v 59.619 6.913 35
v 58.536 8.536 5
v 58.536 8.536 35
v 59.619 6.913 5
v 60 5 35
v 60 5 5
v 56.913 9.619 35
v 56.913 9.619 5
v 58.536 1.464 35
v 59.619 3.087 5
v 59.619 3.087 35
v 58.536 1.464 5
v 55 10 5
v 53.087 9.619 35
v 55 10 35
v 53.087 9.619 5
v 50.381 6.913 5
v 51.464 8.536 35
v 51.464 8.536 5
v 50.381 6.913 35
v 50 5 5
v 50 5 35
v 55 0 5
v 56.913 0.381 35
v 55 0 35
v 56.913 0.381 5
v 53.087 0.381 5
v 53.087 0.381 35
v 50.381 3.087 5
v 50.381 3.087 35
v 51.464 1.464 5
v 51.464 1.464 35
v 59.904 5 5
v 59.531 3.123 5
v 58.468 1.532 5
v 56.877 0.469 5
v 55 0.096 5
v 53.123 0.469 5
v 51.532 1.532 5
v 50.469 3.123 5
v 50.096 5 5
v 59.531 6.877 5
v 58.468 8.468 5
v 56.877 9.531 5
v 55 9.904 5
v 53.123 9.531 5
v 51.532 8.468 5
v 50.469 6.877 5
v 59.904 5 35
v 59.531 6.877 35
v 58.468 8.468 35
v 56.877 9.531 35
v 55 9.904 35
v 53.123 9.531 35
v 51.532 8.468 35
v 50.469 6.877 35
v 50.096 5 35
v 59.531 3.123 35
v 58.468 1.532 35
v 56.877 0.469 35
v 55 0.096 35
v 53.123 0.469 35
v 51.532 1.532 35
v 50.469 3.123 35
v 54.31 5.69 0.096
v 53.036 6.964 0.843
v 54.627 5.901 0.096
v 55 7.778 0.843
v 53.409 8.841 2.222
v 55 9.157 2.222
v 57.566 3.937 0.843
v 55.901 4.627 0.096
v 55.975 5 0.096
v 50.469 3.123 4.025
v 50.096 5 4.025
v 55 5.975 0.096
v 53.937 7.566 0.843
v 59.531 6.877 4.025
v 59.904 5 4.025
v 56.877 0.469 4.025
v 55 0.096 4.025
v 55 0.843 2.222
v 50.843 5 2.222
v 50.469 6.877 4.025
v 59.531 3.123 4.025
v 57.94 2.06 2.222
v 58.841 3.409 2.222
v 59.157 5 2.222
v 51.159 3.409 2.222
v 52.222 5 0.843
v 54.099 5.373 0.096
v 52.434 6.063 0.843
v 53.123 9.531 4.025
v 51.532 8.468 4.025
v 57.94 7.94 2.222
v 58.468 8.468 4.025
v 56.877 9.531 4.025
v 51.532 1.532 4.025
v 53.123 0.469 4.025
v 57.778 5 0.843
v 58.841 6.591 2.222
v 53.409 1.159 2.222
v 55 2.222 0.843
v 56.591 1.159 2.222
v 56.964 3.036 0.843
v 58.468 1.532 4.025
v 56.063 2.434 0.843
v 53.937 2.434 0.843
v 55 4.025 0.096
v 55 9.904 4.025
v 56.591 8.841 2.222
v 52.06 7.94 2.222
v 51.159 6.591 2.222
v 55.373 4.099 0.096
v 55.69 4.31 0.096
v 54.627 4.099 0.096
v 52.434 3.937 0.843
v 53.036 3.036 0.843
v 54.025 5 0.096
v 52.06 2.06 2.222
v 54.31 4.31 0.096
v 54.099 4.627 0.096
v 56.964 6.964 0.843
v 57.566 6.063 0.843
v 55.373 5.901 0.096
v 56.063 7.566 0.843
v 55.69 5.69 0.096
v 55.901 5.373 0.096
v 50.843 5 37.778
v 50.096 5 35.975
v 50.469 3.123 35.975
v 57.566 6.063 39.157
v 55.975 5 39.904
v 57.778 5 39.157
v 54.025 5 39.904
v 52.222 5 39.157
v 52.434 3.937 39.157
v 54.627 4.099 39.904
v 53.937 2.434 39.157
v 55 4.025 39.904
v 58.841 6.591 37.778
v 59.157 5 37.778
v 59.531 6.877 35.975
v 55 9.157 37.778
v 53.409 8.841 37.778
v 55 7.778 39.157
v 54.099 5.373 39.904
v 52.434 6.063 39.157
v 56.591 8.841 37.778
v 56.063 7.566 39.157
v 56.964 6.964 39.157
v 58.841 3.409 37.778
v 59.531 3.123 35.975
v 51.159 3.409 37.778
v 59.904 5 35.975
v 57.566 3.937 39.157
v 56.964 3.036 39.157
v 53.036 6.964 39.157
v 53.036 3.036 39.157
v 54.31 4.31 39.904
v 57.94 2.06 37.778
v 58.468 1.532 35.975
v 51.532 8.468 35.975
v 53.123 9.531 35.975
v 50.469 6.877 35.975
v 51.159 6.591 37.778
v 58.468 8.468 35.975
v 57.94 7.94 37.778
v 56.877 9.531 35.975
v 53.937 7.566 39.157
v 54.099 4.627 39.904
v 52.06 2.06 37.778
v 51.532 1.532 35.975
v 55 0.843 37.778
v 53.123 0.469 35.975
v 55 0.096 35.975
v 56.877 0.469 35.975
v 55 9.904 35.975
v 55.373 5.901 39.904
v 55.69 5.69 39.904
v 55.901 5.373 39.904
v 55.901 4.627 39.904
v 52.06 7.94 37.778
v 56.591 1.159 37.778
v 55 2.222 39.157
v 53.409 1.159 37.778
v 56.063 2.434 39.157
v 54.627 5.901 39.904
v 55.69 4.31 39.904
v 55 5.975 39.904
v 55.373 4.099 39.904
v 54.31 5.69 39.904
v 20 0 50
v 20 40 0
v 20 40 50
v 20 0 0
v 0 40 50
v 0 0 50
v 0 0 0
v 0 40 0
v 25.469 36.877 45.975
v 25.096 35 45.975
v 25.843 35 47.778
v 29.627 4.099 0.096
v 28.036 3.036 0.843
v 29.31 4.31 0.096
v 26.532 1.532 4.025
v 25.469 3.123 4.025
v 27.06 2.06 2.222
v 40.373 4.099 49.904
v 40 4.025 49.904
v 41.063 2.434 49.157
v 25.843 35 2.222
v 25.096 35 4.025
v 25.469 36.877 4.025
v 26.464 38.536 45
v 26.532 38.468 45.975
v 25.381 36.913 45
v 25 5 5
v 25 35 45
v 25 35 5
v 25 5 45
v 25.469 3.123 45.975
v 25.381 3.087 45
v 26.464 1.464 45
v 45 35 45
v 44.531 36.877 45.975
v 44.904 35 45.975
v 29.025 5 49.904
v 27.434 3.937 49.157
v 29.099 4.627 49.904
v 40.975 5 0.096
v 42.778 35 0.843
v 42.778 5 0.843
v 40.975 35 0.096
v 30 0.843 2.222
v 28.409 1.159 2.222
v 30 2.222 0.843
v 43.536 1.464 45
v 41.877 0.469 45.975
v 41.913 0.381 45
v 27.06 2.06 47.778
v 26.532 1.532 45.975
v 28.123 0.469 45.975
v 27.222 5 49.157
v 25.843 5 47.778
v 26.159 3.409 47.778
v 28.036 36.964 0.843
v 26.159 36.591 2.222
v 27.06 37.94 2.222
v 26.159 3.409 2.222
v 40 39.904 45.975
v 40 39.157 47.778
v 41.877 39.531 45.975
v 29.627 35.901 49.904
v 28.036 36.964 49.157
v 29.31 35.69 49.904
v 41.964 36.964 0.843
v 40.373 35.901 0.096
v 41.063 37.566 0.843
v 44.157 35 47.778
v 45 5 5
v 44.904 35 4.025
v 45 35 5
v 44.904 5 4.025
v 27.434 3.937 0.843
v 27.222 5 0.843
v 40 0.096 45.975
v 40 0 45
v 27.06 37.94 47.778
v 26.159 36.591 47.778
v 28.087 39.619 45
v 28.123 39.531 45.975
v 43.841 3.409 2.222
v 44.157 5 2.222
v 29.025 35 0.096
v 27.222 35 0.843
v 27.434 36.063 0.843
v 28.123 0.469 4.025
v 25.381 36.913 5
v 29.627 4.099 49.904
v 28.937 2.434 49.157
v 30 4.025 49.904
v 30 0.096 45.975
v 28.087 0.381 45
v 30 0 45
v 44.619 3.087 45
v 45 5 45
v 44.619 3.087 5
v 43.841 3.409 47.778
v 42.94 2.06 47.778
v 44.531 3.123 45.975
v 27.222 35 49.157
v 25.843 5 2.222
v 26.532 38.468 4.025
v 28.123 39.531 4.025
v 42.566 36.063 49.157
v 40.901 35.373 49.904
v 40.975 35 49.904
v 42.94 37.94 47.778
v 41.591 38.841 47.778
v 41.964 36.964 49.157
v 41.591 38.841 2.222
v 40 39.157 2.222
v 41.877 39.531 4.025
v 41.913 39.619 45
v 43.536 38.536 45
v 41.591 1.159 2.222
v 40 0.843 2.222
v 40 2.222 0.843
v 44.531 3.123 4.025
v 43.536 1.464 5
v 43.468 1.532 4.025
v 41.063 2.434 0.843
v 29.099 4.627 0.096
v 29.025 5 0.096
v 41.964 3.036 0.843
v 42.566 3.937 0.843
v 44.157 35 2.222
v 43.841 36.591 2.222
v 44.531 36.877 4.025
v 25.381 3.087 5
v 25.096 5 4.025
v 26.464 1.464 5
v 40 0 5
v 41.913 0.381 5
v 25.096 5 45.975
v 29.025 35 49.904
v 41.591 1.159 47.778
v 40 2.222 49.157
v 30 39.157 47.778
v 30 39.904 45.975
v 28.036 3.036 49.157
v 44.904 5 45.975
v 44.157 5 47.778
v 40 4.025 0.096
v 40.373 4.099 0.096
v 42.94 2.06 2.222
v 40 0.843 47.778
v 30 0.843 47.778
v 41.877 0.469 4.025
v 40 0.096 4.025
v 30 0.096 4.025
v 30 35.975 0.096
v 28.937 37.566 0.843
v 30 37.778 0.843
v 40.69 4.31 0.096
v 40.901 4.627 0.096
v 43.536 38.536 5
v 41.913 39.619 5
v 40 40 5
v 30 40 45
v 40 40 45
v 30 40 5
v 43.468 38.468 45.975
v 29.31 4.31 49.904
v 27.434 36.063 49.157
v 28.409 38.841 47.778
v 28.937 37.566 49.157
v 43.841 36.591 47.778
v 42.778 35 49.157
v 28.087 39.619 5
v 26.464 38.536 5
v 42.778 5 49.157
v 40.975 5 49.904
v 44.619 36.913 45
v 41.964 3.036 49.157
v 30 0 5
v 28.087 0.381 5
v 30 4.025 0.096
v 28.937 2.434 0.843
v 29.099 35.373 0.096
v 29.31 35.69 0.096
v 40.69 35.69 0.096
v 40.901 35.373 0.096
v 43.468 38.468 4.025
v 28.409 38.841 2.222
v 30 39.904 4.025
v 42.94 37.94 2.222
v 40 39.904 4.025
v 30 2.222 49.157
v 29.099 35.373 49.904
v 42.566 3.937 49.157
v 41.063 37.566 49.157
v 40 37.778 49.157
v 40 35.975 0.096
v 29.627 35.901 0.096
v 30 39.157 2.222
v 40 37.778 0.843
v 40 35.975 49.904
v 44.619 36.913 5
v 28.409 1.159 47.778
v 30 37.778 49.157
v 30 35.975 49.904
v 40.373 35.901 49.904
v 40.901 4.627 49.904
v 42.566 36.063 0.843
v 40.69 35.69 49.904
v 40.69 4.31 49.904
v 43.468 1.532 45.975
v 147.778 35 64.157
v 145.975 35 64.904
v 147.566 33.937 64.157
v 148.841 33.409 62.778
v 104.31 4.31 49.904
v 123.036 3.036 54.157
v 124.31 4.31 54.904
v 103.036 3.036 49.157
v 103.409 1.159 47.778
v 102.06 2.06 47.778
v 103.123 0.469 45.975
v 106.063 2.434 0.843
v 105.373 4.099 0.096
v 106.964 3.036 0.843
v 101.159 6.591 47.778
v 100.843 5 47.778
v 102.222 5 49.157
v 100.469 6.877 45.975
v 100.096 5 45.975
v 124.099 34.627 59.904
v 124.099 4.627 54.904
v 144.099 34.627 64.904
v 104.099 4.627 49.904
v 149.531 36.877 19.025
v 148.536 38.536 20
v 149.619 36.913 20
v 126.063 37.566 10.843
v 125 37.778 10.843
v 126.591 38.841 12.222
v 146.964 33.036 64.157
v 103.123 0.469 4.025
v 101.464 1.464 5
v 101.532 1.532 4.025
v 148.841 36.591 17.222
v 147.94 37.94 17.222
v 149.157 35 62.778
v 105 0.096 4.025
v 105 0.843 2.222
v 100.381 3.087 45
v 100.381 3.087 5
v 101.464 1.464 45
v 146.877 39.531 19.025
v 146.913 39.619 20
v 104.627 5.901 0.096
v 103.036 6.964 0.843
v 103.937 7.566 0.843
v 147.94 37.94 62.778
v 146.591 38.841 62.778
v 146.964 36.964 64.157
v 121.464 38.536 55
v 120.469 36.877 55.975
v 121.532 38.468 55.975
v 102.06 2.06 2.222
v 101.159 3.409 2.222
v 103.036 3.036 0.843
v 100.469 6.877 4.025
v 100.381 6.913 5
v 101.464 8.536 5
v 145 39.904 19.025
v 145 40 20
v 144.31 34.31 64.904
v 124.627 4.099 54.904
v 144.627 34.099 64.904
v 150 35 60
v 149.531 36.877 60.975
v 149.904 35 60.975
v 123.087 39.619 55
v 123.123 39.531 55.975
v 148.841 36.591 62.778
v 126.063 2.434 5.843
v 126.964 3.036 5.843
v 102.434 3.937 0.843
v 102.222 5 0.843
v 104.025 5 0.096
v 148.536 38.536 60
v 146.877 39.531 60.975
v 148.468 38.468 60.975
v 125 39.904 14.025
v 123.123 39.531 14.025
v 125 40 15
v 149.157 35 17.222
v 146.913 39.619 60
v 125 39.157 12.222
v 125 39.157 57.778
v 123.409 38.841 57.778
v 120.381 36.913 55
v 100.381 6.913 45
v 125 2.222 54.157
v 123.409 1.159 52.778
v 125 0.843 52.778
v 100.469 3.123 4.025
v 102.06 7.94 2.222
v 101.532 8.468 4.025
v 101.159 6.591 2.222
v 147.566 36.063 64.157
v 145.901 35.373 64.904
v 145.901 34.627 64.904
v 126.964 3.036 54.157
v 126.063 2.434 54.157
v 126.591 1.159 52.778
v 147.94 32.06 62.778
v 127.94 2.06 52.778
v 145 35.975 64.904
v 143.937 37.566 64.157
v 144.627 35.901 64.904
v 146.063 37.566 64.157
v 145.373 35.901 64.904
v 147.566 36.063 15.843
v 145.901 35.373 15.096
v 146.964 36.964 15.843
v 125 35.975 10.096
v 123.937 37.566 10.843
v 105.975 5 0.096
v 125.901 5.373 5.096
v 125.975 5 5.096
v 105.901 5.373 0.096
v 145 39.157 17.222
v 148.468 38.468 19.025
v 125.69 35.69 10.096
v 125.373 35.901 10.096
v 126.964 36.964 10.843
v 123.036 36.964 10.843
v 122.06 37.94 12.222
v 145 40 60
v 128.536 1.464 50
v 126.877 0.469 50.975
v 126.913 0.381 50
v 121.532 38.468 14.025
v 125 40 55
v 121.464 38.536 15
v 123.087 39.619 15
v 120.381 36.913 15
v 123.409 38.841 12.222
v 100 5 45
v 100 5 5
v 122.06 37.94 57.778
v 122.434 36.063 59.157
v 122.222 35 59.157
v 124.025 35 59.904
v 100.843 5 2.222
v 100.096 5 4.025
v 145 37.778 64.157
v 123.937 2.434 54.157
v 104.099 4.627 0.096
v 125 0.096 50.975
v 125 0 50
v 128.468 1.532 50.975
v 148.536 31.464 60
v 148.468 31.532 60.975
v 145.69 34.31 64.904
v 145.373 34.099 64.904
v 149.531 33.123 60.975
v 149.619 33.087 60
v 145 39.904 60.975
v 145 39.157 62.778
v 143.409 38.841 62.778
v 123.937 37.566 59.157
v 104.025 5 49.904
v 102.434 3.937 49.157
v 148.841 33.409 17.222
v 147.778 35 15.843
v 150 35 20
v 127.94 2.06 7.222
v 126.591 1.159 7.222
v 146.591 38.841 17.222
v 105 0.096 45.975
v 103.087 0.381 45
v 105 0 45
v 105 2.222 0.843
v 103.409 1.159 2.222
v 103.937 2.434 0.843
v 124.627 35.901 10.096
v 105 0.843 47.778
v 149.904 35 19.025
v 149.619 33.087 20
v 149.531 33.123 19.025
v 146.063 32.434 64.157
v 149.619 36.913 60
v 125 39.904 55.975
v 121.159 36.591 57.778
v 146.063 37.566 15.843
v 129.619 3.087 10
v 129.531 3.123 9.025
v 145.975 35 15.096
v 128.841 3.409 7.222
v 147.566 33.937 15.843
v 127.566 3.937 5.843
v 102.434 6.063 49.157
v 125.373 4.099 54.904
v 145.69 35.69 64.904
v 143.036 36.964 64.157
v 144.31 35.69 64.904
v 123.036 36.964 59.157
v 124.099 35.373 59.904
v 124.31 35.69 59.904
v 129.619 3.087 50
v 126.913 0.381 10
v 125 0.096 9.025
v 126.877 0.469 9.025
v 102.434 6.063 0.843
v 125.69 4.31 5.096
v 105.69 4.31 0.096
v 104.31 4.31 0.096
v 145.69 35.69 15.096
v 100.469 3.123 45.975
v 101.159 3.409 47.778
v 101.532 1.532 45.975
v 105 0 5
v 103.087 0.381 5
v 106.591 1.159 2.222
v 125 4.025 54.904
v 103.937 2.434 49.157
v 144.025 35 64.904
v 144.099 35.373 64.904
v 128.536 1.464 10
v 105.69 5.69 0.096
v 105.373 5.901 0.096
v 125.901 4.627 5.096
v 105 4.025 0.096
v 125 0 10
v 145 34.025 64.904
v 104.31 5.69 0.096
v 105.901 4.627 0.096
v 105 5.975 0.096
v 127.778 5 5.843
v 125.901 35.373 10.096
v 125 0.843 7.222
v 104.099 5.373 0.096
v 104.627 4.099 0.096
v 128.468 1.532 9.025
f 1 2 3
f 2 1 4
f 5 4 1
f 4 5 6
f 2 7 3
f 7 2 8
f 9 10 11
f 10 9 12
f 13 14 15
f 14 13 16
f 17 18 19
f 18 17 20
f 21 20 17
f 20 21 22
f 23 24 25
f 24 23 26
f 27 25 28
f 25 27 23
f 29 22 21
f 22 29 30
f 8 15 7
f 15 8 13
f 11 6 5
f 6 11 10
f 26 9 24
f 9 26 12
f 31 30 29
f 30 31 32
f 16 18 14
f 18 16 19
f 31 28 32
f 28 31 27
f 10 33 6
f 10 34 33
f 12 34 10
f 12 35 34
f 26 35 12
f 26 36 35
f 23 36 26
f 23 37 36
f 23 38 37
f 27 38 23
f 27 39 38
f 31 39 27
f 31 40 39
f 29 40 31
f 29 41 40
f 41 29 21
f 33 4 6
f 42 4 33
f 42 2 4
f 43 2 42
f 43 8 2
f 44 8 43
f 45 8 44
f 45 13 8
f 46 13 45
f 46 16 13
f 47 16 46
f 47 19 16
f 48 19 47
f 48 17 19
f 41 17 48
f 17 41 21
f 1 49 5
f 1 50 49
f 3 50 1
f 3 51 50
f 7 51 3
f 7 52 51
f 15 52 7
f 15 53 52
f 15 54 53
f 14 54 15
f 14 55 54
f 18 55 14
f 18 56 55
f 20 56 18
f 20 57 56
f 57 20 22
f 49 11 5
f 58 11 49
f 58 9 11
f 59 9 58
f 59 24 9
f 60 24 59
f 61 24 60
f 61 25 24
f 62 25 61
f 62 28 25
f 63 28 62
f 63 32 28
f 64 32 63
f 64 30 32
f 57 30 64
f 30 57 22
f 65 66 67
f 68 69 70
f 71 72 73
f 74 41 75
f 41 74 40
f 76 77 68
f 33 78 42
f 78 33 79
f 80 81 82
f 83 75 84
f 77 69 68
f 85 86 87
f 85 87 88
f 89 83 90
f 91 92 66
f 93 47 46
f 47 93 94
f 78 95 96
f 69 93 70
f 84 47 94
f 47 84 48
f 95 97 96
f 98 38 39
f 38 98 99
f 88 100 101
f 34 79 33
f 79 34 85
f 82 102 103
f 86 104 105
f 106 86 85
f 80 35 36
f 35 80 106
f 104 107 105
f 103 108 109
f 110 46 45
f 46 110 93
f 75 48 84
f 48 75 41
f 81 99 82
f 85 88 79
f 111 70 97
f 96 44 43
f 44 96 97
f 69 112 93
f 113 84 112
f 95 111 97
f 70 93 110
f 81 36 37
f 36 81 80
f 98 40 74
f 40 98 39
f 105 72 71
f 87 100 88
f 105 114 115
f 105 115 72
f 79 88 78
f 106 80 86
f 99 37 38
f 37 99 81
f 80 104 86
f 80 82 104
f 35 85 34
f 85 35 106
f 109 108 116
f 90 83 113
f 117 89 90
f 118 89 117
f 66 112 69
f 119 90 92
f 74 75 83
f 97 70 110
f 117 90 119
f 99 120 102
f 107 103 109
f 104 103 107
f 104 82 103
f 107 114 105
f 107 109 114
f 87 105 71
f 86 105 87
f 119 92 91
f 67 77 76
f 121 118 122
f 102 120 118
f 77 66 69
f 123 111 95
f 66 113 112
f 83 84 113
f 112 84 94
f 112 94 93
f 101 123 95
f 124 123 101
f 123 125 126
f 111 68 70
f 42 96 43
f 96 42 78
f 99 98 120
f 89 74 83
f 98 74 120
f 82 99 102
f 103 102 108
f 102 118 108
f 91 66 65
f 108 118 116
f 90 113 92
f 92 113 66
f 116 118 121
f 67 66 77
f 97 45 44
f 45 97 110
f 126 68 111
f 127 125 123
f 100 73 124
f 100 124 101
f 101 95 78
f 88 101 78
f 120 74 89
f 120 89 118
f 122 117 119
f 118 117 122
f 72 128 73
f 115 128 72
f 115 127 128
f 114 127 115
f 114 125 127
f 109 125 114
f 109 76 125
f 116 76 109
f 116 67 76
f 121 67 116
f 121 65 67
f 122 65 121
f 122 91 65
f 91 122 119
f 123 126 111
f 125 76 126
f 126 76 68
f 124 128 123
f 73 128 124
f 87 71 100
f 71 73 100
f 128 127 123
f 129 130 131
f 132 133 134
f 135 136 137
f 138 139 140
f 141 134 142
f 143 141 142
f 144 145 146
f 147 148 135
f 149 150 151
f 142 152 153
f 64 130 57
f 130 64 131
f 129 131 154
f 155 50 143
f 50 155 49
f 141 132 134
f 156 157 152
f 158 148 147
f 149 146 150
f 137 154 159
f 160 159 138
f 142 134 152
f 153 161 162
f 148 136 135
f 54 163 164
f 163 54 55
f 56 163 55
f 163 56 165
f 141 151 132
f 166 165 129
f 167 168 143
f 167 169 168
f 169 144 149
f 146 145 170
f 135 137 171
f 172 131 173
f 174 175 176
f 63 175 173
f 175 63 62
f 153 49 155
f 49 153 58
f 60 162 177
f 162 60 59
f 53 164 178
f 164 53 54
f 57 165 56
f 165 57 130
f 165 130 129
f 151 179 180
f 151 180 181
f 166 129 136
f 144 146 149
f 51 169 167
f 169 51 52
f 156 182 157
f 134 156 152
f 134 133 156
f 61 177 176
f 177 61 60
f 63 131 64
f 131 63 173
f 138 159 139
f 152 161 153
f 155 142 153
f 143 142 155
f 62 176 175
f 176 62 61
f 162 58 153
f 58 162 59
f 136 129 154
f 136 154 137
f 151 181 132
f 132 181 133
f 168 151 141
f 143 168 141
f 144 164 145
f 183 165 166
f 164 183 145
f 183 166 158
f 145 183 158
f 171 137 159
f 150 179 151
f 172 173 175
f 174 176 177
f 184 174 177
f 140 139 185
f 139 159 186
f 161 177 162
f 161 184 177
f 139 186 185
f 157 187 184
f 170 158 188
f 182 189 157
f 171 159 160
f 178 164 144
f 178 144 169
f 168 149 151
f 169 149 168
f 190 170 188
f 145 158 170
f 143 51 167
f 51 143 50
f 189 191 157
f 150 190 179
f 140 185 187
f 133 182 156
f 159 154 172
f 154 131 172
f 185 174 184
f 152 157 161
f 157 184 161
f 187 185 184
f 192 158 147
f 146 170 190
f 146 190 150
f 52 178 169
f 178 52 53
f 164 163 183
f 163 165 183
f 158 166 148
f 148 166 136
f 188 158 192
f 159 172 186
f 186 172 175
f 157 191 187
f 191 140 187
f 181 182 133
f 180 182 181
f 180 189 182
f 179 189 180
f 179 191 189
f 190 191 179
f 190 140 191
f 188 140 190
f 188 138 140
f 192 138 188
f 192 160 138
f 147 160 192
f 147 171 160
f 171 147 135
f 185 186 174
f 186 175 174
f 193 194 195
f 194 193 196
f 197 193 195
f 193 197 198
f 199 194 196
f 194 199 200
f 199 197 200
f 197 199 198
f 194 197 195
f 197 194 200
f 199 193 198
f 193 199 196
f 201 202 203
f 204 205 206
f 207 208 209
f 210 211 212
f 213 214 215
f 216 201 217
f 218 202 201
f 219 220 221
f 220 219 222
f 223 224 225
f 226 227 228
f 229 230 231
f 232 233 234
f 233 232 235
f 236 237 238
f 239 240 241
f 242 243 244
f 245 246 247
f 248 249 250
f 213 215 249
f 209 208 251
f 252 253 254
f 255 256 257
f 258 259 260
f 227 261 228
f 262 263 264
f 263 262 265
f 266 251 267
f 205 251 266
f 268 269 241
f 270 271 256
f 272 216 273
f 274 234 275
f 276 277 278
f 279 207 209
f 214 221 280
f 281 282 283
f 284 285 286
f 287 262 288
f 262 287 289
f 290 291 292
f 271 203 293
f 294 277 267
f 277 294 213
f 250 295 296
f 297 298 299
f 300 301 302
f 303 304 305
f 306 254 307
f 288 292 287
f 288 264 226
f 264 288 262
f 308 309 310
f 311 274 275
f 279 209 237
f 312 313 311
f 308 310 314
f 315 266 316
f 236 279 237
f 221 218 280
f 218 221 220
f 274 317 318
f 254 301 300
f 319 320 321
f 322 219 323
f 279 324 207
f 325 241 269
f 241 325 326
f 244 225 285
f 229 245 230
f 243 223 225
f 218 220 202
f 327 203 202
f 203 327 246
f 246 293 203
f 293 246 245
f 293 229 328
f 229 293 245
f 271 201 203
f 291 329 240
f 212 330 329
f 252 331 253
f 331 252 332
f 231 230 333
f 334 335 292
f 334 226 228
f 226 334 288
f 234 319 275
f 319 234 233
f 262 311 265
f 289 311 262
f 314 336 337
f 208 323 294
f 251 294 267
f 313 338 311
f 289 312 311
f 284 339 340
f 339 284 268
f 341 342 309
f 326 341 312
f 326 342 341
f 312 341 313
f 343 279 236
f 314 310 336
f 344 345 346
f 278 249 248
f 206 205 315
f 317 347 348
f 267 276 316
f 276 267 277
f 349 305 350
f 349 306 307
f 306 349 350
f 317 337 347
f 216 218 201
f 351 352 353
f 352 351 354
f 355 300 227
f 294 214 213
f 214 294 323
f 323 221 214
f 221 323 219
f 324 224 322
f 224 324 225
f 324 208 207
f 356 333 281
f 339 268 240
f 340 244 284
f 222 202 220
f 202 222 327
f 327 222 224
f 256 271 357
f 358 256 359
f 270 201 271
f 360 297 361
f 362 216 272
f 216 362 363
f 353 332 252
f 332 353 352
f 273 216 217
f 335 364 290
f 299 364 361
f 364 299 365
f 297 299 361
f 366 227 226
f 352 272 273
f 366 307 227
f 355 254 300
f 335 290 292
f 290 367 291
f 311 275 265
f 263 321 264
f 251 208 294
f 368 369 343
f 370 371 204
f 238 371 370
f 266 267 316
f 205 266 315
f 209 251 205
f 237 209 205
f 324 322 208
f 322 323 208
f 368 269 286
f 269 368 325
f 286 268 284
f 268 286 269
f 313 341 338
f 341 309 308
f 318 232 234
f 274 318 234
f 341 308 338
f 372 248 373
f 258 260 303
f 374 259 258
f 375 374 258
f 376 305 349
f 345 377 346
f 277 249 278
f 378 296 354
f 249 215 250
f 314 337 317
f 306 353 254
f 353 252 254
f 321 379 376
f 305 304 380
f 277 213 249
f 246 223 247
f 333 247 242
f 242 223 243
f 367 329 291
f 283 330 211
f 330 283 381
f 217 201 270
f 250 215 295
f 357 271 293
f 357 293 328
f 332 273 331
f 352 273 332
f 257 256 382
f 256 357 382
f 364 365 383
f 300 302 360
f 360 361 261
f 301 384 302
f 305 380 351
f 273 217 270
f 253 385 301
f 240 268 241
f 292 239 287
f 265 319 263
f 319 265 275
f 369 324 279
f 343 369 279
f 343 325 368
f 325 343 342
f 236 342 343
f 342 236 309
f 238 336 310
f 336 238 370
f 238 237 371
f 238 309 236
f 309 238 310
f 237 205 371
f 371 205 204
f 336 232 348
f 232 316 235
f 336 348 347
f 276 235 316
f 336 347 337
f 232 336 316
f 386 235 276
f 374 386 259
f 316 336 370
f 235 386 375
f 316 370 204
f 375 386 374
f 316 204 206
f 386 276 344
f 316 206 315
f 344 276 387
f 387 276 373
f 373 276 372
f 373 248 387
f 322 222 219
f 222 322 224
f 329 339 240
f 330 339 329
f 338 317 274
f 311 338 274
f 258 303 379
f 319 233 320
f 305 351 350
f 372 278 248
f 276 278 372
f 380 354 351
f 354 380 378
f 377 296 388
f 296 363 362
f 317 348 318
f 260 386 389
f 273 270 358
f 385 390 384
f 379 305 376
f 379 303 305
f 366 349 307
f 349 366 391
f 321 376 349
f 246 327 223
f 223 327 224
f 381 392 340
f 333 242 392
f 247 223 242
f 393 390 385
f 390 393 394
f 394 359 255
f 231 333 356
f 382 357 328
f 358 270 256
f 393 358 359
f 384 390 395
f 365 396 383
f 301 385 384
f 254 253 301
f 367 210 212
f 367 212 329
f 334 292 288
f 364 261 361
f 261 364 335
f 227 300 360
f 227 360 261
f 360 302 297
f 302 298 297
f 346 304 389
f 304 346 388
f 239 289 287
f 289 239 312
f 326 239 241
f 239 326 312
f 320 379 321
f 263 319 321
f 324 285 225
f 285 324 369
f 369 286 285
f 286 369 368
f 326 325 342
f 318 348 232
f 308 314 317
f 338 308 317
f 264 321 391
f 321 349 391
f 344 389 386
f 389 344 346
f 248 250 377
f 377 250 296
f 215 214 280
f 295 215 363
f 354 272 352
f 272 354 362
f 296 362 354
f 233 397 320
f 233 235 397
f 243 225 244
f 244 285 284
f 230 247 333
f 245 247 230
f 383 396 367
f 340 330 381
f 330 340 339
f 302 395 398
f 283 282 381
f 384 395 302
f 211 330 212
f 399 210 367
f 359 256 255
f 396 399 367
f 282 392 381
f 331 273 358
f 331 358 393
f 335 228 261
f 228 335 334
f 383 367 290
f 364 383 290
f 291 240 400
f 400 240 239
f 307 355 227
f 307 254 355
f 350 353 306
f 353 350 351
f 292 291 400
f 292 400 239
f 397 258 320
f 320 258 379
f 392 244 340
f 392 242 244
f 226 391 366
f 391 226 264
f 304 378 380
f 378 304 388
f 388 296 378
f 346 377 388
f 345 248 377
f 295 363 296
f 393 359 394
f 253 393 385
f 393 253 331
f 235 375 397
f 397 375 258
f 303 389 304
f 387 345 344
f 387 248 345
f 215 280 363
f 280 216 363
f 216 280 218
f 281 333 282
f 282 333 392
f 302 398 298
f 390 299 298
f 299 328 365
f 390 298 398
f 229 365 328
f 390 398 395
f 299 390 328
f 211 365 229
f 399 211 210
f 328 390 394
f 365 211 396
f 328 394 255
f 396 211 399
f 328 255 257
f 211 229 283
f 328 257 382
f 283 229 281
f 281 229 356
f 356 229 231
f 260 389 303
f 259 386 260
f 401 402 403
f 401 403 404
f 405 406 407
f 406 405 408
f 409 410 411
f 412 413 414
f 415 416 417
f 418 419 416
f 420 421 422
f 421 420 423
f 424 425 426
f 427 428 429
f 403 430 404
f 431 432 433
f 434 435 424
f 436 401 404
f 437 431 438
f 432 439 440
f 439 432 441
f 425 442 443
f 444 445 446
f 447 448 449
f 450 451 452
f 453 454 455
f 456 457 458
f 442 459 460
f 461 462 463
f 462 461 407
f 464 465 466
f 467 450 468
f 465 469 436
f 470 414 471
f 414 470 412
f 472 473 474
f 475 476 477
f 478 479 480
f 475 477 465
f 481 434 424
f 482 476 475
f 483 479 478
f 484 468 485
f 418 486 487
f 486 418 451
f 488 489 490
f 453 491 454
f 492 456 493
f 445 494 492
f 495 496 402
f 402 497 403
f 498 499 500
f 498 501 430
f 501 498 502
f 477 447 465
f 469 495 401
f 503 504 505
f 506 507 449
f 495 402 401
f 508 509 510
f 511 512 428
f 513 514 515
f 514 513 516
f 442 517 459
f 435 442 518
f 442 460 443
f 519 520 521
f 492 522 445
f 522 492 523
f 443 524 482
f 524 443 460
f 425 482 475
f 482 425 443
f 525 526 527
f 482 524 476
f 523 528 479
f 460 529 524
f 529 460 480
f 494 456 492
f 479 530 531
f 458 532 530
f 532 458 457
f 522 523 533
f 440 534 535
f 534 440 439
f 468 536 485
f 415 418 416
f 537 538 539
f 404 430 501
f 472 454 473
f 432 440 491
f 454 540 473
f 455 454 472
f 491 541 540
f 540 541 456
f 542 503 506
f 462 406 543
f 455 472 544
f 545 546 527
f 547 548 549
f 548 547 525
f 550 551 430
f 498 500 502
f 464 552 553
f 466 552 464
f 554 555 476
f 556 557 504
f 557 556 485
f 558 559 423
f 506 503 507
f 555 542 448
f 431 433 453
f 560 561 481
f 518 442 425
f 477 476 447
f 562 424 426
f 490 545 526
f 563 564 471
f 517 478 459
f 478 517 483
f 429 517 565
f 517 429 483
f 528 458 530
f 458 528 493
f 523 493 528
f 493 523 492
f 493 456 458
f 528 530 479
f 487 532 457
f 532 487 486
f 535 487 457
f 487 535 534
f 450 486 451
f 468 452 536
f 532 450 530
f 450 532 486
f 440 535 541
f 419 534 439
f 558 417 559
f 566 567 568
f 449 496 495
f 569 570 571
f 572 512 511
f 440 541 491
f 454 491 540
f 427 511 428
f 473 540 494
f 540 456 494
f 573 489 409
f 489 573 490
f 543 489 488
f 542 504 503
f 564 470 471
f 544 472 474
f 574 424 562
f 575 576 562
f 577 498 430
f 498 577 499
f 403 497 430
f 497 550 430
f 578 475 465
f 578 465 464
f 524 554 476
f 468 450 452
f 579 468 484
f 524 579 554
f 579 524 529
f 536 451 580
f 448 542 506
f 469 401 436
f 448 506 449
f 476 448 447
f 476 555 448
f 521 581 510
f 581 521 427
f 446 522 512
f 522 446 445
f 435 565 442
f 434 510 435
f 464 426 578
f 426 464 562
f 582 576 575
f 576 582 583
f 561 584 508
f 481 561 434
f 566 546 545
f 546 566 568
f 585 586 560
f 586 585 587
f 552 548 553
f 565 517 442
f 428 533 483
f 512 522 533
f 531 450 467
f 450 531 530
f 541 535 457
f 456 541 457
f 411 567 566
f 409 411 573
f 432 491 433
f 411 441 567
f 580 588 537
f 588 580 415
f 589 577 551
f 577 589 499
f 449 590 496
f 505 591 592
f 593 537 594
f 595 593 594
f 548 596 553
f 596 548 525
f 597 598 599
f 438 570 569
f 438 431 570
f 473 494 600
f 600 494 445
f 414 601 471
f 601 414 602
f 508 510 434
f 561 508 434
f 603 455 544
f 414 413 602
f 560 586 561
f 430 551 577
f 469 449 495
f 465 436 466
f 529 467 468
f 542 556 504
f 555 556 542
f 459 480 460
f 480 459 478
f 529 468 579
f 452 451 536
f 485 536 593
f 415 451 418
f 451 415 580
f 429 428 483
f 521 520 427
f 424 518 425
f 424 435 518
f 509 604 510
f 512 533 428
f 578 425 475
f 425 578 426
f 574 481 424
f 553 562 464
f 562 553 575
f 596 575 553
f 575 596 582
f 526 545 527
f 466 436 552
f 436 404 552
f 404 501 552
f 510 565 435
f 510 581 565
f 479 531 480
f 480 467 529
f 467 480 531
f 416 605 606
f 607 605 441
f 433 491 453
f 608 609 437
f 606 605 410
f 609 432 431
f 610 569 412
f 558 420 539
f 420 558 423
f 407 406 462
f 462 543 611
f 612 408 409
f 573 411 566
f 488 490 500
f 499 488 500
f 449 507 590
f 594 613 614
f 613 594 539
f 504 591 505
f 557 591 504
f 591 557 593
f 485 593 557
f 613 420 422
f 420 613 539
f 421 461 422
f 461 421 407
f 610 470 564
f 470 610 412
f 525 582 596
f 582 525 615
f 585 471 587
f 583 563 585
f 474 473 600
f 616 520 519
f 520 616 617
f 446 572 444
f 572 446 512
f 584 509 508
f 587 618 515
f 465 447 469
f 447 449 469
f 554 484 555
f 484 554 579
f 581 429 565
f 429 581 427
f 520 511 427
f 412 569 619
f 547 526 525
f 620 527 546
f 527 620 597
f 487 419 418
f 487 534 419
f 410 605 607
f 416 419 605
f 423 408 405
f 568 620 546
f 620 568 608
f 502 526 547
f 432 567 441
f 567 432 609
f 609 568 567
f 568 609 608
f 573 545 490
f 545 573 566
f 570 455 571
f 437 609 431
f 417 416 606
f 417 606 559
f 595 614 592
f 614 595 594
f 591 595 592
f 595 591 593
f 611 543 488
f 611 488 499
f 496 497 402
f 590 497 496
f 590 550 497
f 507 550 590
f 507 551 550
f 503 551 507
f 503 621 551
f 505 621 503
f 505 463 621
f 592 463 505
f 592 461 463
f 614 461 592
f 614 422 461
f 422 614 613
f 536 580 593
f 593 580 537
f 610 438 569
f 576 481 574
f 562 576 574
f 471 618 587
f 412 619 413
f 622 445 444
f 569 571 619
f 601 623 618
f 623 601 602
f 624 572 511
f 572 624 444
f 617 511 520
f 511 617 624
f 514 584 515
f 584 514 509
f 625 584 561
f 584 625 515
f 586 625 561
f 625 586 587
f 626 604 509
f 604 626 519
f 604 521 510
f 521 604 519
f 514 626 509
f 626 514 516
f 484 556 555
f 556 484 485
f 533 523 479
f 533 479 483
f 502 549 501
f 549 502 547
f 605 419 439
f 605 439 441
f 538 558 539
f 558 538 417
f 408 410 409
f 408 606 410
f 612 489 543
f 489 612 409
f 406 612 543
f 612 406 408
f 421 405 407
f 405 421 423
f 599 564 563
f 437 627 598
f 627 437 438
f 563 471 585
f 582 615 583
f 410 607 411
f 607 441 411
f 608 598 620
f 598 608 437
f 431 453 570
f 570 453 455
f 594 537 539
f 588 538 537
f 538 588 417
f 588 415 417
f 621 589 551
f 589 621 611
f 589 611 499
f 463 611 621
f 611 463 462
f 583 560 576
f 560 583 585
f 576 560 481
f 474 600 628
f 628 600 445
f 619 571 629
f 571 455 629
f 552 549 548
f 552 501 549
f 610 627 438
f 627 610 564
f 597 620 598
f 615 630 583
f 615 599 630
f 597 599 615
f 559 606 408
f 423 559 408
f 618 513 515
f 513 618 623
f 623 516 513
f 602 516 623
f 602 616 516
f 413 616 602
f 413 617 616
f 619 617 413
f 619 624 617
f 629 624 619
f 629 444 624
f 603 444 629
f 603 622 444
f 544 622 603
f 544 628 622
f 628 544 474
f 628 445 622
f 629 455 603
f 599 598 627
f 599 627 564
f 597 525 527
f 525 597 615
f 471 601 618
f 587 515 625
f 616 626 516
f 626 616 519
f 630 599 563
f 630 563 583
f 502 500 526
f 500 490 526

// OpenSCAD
/* **********************************************************************
*** Modules in this file
*** dim_lumber(dims,displayname)
*** roundBox(x,y,z,r)
*** module capsule(z,r)
*** module translate_children()
*** module roundedPlate(x,y,rad)
**************************************************************************** */

// use <common_modules.scad>
x=20;
y=40;
z=50;
r=5;

translate([0,0,0])dim_lumber([x,y,z],"Lumber");

translate([25,0,0])roundBox(x,y,z,r,"R Box");

translate([50,0,0]) capsule(y,r, "Capsule Demo");

translate([75,0,0]) roundedPlate(x,y,r, "Rounded Plate demo");

translate([100,0,0])hull(){translate_children(){
    capsule(z,r,"Child 1");
    translate([x-(r*2),0,0])capsule(z,r,"Child 2");
    translate([0,y-(r*2),0])capsule(z,r,"Child 3");
    translate([x-(r*2),y-(r*2),0])capsule(z,r,"Child 4");
    
    }
    
}


// Modules are below /////////////////////////////////////////

module dim_lumber(dims,displayname){
    echo ("Cut list: ",displayname,dims);
    cube(dims);
}

module roundBox(x,y,z,r,displayName="Unk")
{
    echo ("Round Box: ",displayName,x,y,z,r);
    
    hull(){
    capsule(z,r,displayName);
    translate([x-(r*2),0,0])capsule(z,r,displayName);
    translate([0,y-(r*2),0])capsule(z,r,displayName);
    translate([x-(r*2),y-(r*2),0])capsule(z,r,displayName);
    }
    
}


module capsule(z,r,displayName="Unk")
{
    echo ("Capsule: ",displayName,z,r);
    
    translate([r,r,r])cylinder(z-(2*r),r,r);    
    translate([r,r,r])sphere(r);
    translate([r,r,z-r])sphere(r);
    
    
}

module translate_children()
{
    
    
    for(i=[0:$children-1])
    {
        translate([i*10,0,i*5])children(i);
    }
    
}

module roundedPlate(x,y,rad,displayName="Unk")
{
    echo ("Round Plate: ",displayName,x,y,rad);
    hull(){
    translate([rad,rad,0])circle(rad);
    translate([x-rad,rad,0])circle(rad);
    translate([x-rad,y-rad,0])circle(rad);
    translate([rad,y-rad,0])circle(rad);
    }
}

module drawBezelBox(is_x,is_y,is_total,is_r,bz_x,bz_y,bz_z,bz_r,Name="unknown"){
    
    union(){
    linear_extrude(bz_z)roundedPlate(bz_x,bz_y,bz_r,Name);
    translate([(bz_x-is_x)/2,(bz_y-is_y)/2,bz_z])linear_extrude(is_total-bz_z)roundedPlate(is_x,is_y,is_r,Name);   
    }
    
}

module drawBezelBoxCutout(is_x,is_y,is_total,is_r,bz_x,bz_y,bz_z,bz_r,Name="unknown"){
     union(){
   // linear_extrude(bz_z)roundedPlate(bz_x,bz_y,bz_r,Name);
    translate([(bz_x-is_x)/2,(bz_y-is_y)/2,-1])linear_extrude(2+is_total-bz_z)roundedPlate(is_x,is_y,is_r,Name);   
    }
}

module roundedHollowBox(od_x,od_y,od_z,od_r,wall_thick){
   
    difference(){
    linear_extrude(od_z)roundedPlate(od_x,od_y,od_r);
    
    translate([wall_thick,wall_thick,wall_thick])linear_extrude(1+od_z-wall_thick)roundedPlate(od_x-wall_thick*2,od_y-wall_thick*2,od_r);
    }
    
}
